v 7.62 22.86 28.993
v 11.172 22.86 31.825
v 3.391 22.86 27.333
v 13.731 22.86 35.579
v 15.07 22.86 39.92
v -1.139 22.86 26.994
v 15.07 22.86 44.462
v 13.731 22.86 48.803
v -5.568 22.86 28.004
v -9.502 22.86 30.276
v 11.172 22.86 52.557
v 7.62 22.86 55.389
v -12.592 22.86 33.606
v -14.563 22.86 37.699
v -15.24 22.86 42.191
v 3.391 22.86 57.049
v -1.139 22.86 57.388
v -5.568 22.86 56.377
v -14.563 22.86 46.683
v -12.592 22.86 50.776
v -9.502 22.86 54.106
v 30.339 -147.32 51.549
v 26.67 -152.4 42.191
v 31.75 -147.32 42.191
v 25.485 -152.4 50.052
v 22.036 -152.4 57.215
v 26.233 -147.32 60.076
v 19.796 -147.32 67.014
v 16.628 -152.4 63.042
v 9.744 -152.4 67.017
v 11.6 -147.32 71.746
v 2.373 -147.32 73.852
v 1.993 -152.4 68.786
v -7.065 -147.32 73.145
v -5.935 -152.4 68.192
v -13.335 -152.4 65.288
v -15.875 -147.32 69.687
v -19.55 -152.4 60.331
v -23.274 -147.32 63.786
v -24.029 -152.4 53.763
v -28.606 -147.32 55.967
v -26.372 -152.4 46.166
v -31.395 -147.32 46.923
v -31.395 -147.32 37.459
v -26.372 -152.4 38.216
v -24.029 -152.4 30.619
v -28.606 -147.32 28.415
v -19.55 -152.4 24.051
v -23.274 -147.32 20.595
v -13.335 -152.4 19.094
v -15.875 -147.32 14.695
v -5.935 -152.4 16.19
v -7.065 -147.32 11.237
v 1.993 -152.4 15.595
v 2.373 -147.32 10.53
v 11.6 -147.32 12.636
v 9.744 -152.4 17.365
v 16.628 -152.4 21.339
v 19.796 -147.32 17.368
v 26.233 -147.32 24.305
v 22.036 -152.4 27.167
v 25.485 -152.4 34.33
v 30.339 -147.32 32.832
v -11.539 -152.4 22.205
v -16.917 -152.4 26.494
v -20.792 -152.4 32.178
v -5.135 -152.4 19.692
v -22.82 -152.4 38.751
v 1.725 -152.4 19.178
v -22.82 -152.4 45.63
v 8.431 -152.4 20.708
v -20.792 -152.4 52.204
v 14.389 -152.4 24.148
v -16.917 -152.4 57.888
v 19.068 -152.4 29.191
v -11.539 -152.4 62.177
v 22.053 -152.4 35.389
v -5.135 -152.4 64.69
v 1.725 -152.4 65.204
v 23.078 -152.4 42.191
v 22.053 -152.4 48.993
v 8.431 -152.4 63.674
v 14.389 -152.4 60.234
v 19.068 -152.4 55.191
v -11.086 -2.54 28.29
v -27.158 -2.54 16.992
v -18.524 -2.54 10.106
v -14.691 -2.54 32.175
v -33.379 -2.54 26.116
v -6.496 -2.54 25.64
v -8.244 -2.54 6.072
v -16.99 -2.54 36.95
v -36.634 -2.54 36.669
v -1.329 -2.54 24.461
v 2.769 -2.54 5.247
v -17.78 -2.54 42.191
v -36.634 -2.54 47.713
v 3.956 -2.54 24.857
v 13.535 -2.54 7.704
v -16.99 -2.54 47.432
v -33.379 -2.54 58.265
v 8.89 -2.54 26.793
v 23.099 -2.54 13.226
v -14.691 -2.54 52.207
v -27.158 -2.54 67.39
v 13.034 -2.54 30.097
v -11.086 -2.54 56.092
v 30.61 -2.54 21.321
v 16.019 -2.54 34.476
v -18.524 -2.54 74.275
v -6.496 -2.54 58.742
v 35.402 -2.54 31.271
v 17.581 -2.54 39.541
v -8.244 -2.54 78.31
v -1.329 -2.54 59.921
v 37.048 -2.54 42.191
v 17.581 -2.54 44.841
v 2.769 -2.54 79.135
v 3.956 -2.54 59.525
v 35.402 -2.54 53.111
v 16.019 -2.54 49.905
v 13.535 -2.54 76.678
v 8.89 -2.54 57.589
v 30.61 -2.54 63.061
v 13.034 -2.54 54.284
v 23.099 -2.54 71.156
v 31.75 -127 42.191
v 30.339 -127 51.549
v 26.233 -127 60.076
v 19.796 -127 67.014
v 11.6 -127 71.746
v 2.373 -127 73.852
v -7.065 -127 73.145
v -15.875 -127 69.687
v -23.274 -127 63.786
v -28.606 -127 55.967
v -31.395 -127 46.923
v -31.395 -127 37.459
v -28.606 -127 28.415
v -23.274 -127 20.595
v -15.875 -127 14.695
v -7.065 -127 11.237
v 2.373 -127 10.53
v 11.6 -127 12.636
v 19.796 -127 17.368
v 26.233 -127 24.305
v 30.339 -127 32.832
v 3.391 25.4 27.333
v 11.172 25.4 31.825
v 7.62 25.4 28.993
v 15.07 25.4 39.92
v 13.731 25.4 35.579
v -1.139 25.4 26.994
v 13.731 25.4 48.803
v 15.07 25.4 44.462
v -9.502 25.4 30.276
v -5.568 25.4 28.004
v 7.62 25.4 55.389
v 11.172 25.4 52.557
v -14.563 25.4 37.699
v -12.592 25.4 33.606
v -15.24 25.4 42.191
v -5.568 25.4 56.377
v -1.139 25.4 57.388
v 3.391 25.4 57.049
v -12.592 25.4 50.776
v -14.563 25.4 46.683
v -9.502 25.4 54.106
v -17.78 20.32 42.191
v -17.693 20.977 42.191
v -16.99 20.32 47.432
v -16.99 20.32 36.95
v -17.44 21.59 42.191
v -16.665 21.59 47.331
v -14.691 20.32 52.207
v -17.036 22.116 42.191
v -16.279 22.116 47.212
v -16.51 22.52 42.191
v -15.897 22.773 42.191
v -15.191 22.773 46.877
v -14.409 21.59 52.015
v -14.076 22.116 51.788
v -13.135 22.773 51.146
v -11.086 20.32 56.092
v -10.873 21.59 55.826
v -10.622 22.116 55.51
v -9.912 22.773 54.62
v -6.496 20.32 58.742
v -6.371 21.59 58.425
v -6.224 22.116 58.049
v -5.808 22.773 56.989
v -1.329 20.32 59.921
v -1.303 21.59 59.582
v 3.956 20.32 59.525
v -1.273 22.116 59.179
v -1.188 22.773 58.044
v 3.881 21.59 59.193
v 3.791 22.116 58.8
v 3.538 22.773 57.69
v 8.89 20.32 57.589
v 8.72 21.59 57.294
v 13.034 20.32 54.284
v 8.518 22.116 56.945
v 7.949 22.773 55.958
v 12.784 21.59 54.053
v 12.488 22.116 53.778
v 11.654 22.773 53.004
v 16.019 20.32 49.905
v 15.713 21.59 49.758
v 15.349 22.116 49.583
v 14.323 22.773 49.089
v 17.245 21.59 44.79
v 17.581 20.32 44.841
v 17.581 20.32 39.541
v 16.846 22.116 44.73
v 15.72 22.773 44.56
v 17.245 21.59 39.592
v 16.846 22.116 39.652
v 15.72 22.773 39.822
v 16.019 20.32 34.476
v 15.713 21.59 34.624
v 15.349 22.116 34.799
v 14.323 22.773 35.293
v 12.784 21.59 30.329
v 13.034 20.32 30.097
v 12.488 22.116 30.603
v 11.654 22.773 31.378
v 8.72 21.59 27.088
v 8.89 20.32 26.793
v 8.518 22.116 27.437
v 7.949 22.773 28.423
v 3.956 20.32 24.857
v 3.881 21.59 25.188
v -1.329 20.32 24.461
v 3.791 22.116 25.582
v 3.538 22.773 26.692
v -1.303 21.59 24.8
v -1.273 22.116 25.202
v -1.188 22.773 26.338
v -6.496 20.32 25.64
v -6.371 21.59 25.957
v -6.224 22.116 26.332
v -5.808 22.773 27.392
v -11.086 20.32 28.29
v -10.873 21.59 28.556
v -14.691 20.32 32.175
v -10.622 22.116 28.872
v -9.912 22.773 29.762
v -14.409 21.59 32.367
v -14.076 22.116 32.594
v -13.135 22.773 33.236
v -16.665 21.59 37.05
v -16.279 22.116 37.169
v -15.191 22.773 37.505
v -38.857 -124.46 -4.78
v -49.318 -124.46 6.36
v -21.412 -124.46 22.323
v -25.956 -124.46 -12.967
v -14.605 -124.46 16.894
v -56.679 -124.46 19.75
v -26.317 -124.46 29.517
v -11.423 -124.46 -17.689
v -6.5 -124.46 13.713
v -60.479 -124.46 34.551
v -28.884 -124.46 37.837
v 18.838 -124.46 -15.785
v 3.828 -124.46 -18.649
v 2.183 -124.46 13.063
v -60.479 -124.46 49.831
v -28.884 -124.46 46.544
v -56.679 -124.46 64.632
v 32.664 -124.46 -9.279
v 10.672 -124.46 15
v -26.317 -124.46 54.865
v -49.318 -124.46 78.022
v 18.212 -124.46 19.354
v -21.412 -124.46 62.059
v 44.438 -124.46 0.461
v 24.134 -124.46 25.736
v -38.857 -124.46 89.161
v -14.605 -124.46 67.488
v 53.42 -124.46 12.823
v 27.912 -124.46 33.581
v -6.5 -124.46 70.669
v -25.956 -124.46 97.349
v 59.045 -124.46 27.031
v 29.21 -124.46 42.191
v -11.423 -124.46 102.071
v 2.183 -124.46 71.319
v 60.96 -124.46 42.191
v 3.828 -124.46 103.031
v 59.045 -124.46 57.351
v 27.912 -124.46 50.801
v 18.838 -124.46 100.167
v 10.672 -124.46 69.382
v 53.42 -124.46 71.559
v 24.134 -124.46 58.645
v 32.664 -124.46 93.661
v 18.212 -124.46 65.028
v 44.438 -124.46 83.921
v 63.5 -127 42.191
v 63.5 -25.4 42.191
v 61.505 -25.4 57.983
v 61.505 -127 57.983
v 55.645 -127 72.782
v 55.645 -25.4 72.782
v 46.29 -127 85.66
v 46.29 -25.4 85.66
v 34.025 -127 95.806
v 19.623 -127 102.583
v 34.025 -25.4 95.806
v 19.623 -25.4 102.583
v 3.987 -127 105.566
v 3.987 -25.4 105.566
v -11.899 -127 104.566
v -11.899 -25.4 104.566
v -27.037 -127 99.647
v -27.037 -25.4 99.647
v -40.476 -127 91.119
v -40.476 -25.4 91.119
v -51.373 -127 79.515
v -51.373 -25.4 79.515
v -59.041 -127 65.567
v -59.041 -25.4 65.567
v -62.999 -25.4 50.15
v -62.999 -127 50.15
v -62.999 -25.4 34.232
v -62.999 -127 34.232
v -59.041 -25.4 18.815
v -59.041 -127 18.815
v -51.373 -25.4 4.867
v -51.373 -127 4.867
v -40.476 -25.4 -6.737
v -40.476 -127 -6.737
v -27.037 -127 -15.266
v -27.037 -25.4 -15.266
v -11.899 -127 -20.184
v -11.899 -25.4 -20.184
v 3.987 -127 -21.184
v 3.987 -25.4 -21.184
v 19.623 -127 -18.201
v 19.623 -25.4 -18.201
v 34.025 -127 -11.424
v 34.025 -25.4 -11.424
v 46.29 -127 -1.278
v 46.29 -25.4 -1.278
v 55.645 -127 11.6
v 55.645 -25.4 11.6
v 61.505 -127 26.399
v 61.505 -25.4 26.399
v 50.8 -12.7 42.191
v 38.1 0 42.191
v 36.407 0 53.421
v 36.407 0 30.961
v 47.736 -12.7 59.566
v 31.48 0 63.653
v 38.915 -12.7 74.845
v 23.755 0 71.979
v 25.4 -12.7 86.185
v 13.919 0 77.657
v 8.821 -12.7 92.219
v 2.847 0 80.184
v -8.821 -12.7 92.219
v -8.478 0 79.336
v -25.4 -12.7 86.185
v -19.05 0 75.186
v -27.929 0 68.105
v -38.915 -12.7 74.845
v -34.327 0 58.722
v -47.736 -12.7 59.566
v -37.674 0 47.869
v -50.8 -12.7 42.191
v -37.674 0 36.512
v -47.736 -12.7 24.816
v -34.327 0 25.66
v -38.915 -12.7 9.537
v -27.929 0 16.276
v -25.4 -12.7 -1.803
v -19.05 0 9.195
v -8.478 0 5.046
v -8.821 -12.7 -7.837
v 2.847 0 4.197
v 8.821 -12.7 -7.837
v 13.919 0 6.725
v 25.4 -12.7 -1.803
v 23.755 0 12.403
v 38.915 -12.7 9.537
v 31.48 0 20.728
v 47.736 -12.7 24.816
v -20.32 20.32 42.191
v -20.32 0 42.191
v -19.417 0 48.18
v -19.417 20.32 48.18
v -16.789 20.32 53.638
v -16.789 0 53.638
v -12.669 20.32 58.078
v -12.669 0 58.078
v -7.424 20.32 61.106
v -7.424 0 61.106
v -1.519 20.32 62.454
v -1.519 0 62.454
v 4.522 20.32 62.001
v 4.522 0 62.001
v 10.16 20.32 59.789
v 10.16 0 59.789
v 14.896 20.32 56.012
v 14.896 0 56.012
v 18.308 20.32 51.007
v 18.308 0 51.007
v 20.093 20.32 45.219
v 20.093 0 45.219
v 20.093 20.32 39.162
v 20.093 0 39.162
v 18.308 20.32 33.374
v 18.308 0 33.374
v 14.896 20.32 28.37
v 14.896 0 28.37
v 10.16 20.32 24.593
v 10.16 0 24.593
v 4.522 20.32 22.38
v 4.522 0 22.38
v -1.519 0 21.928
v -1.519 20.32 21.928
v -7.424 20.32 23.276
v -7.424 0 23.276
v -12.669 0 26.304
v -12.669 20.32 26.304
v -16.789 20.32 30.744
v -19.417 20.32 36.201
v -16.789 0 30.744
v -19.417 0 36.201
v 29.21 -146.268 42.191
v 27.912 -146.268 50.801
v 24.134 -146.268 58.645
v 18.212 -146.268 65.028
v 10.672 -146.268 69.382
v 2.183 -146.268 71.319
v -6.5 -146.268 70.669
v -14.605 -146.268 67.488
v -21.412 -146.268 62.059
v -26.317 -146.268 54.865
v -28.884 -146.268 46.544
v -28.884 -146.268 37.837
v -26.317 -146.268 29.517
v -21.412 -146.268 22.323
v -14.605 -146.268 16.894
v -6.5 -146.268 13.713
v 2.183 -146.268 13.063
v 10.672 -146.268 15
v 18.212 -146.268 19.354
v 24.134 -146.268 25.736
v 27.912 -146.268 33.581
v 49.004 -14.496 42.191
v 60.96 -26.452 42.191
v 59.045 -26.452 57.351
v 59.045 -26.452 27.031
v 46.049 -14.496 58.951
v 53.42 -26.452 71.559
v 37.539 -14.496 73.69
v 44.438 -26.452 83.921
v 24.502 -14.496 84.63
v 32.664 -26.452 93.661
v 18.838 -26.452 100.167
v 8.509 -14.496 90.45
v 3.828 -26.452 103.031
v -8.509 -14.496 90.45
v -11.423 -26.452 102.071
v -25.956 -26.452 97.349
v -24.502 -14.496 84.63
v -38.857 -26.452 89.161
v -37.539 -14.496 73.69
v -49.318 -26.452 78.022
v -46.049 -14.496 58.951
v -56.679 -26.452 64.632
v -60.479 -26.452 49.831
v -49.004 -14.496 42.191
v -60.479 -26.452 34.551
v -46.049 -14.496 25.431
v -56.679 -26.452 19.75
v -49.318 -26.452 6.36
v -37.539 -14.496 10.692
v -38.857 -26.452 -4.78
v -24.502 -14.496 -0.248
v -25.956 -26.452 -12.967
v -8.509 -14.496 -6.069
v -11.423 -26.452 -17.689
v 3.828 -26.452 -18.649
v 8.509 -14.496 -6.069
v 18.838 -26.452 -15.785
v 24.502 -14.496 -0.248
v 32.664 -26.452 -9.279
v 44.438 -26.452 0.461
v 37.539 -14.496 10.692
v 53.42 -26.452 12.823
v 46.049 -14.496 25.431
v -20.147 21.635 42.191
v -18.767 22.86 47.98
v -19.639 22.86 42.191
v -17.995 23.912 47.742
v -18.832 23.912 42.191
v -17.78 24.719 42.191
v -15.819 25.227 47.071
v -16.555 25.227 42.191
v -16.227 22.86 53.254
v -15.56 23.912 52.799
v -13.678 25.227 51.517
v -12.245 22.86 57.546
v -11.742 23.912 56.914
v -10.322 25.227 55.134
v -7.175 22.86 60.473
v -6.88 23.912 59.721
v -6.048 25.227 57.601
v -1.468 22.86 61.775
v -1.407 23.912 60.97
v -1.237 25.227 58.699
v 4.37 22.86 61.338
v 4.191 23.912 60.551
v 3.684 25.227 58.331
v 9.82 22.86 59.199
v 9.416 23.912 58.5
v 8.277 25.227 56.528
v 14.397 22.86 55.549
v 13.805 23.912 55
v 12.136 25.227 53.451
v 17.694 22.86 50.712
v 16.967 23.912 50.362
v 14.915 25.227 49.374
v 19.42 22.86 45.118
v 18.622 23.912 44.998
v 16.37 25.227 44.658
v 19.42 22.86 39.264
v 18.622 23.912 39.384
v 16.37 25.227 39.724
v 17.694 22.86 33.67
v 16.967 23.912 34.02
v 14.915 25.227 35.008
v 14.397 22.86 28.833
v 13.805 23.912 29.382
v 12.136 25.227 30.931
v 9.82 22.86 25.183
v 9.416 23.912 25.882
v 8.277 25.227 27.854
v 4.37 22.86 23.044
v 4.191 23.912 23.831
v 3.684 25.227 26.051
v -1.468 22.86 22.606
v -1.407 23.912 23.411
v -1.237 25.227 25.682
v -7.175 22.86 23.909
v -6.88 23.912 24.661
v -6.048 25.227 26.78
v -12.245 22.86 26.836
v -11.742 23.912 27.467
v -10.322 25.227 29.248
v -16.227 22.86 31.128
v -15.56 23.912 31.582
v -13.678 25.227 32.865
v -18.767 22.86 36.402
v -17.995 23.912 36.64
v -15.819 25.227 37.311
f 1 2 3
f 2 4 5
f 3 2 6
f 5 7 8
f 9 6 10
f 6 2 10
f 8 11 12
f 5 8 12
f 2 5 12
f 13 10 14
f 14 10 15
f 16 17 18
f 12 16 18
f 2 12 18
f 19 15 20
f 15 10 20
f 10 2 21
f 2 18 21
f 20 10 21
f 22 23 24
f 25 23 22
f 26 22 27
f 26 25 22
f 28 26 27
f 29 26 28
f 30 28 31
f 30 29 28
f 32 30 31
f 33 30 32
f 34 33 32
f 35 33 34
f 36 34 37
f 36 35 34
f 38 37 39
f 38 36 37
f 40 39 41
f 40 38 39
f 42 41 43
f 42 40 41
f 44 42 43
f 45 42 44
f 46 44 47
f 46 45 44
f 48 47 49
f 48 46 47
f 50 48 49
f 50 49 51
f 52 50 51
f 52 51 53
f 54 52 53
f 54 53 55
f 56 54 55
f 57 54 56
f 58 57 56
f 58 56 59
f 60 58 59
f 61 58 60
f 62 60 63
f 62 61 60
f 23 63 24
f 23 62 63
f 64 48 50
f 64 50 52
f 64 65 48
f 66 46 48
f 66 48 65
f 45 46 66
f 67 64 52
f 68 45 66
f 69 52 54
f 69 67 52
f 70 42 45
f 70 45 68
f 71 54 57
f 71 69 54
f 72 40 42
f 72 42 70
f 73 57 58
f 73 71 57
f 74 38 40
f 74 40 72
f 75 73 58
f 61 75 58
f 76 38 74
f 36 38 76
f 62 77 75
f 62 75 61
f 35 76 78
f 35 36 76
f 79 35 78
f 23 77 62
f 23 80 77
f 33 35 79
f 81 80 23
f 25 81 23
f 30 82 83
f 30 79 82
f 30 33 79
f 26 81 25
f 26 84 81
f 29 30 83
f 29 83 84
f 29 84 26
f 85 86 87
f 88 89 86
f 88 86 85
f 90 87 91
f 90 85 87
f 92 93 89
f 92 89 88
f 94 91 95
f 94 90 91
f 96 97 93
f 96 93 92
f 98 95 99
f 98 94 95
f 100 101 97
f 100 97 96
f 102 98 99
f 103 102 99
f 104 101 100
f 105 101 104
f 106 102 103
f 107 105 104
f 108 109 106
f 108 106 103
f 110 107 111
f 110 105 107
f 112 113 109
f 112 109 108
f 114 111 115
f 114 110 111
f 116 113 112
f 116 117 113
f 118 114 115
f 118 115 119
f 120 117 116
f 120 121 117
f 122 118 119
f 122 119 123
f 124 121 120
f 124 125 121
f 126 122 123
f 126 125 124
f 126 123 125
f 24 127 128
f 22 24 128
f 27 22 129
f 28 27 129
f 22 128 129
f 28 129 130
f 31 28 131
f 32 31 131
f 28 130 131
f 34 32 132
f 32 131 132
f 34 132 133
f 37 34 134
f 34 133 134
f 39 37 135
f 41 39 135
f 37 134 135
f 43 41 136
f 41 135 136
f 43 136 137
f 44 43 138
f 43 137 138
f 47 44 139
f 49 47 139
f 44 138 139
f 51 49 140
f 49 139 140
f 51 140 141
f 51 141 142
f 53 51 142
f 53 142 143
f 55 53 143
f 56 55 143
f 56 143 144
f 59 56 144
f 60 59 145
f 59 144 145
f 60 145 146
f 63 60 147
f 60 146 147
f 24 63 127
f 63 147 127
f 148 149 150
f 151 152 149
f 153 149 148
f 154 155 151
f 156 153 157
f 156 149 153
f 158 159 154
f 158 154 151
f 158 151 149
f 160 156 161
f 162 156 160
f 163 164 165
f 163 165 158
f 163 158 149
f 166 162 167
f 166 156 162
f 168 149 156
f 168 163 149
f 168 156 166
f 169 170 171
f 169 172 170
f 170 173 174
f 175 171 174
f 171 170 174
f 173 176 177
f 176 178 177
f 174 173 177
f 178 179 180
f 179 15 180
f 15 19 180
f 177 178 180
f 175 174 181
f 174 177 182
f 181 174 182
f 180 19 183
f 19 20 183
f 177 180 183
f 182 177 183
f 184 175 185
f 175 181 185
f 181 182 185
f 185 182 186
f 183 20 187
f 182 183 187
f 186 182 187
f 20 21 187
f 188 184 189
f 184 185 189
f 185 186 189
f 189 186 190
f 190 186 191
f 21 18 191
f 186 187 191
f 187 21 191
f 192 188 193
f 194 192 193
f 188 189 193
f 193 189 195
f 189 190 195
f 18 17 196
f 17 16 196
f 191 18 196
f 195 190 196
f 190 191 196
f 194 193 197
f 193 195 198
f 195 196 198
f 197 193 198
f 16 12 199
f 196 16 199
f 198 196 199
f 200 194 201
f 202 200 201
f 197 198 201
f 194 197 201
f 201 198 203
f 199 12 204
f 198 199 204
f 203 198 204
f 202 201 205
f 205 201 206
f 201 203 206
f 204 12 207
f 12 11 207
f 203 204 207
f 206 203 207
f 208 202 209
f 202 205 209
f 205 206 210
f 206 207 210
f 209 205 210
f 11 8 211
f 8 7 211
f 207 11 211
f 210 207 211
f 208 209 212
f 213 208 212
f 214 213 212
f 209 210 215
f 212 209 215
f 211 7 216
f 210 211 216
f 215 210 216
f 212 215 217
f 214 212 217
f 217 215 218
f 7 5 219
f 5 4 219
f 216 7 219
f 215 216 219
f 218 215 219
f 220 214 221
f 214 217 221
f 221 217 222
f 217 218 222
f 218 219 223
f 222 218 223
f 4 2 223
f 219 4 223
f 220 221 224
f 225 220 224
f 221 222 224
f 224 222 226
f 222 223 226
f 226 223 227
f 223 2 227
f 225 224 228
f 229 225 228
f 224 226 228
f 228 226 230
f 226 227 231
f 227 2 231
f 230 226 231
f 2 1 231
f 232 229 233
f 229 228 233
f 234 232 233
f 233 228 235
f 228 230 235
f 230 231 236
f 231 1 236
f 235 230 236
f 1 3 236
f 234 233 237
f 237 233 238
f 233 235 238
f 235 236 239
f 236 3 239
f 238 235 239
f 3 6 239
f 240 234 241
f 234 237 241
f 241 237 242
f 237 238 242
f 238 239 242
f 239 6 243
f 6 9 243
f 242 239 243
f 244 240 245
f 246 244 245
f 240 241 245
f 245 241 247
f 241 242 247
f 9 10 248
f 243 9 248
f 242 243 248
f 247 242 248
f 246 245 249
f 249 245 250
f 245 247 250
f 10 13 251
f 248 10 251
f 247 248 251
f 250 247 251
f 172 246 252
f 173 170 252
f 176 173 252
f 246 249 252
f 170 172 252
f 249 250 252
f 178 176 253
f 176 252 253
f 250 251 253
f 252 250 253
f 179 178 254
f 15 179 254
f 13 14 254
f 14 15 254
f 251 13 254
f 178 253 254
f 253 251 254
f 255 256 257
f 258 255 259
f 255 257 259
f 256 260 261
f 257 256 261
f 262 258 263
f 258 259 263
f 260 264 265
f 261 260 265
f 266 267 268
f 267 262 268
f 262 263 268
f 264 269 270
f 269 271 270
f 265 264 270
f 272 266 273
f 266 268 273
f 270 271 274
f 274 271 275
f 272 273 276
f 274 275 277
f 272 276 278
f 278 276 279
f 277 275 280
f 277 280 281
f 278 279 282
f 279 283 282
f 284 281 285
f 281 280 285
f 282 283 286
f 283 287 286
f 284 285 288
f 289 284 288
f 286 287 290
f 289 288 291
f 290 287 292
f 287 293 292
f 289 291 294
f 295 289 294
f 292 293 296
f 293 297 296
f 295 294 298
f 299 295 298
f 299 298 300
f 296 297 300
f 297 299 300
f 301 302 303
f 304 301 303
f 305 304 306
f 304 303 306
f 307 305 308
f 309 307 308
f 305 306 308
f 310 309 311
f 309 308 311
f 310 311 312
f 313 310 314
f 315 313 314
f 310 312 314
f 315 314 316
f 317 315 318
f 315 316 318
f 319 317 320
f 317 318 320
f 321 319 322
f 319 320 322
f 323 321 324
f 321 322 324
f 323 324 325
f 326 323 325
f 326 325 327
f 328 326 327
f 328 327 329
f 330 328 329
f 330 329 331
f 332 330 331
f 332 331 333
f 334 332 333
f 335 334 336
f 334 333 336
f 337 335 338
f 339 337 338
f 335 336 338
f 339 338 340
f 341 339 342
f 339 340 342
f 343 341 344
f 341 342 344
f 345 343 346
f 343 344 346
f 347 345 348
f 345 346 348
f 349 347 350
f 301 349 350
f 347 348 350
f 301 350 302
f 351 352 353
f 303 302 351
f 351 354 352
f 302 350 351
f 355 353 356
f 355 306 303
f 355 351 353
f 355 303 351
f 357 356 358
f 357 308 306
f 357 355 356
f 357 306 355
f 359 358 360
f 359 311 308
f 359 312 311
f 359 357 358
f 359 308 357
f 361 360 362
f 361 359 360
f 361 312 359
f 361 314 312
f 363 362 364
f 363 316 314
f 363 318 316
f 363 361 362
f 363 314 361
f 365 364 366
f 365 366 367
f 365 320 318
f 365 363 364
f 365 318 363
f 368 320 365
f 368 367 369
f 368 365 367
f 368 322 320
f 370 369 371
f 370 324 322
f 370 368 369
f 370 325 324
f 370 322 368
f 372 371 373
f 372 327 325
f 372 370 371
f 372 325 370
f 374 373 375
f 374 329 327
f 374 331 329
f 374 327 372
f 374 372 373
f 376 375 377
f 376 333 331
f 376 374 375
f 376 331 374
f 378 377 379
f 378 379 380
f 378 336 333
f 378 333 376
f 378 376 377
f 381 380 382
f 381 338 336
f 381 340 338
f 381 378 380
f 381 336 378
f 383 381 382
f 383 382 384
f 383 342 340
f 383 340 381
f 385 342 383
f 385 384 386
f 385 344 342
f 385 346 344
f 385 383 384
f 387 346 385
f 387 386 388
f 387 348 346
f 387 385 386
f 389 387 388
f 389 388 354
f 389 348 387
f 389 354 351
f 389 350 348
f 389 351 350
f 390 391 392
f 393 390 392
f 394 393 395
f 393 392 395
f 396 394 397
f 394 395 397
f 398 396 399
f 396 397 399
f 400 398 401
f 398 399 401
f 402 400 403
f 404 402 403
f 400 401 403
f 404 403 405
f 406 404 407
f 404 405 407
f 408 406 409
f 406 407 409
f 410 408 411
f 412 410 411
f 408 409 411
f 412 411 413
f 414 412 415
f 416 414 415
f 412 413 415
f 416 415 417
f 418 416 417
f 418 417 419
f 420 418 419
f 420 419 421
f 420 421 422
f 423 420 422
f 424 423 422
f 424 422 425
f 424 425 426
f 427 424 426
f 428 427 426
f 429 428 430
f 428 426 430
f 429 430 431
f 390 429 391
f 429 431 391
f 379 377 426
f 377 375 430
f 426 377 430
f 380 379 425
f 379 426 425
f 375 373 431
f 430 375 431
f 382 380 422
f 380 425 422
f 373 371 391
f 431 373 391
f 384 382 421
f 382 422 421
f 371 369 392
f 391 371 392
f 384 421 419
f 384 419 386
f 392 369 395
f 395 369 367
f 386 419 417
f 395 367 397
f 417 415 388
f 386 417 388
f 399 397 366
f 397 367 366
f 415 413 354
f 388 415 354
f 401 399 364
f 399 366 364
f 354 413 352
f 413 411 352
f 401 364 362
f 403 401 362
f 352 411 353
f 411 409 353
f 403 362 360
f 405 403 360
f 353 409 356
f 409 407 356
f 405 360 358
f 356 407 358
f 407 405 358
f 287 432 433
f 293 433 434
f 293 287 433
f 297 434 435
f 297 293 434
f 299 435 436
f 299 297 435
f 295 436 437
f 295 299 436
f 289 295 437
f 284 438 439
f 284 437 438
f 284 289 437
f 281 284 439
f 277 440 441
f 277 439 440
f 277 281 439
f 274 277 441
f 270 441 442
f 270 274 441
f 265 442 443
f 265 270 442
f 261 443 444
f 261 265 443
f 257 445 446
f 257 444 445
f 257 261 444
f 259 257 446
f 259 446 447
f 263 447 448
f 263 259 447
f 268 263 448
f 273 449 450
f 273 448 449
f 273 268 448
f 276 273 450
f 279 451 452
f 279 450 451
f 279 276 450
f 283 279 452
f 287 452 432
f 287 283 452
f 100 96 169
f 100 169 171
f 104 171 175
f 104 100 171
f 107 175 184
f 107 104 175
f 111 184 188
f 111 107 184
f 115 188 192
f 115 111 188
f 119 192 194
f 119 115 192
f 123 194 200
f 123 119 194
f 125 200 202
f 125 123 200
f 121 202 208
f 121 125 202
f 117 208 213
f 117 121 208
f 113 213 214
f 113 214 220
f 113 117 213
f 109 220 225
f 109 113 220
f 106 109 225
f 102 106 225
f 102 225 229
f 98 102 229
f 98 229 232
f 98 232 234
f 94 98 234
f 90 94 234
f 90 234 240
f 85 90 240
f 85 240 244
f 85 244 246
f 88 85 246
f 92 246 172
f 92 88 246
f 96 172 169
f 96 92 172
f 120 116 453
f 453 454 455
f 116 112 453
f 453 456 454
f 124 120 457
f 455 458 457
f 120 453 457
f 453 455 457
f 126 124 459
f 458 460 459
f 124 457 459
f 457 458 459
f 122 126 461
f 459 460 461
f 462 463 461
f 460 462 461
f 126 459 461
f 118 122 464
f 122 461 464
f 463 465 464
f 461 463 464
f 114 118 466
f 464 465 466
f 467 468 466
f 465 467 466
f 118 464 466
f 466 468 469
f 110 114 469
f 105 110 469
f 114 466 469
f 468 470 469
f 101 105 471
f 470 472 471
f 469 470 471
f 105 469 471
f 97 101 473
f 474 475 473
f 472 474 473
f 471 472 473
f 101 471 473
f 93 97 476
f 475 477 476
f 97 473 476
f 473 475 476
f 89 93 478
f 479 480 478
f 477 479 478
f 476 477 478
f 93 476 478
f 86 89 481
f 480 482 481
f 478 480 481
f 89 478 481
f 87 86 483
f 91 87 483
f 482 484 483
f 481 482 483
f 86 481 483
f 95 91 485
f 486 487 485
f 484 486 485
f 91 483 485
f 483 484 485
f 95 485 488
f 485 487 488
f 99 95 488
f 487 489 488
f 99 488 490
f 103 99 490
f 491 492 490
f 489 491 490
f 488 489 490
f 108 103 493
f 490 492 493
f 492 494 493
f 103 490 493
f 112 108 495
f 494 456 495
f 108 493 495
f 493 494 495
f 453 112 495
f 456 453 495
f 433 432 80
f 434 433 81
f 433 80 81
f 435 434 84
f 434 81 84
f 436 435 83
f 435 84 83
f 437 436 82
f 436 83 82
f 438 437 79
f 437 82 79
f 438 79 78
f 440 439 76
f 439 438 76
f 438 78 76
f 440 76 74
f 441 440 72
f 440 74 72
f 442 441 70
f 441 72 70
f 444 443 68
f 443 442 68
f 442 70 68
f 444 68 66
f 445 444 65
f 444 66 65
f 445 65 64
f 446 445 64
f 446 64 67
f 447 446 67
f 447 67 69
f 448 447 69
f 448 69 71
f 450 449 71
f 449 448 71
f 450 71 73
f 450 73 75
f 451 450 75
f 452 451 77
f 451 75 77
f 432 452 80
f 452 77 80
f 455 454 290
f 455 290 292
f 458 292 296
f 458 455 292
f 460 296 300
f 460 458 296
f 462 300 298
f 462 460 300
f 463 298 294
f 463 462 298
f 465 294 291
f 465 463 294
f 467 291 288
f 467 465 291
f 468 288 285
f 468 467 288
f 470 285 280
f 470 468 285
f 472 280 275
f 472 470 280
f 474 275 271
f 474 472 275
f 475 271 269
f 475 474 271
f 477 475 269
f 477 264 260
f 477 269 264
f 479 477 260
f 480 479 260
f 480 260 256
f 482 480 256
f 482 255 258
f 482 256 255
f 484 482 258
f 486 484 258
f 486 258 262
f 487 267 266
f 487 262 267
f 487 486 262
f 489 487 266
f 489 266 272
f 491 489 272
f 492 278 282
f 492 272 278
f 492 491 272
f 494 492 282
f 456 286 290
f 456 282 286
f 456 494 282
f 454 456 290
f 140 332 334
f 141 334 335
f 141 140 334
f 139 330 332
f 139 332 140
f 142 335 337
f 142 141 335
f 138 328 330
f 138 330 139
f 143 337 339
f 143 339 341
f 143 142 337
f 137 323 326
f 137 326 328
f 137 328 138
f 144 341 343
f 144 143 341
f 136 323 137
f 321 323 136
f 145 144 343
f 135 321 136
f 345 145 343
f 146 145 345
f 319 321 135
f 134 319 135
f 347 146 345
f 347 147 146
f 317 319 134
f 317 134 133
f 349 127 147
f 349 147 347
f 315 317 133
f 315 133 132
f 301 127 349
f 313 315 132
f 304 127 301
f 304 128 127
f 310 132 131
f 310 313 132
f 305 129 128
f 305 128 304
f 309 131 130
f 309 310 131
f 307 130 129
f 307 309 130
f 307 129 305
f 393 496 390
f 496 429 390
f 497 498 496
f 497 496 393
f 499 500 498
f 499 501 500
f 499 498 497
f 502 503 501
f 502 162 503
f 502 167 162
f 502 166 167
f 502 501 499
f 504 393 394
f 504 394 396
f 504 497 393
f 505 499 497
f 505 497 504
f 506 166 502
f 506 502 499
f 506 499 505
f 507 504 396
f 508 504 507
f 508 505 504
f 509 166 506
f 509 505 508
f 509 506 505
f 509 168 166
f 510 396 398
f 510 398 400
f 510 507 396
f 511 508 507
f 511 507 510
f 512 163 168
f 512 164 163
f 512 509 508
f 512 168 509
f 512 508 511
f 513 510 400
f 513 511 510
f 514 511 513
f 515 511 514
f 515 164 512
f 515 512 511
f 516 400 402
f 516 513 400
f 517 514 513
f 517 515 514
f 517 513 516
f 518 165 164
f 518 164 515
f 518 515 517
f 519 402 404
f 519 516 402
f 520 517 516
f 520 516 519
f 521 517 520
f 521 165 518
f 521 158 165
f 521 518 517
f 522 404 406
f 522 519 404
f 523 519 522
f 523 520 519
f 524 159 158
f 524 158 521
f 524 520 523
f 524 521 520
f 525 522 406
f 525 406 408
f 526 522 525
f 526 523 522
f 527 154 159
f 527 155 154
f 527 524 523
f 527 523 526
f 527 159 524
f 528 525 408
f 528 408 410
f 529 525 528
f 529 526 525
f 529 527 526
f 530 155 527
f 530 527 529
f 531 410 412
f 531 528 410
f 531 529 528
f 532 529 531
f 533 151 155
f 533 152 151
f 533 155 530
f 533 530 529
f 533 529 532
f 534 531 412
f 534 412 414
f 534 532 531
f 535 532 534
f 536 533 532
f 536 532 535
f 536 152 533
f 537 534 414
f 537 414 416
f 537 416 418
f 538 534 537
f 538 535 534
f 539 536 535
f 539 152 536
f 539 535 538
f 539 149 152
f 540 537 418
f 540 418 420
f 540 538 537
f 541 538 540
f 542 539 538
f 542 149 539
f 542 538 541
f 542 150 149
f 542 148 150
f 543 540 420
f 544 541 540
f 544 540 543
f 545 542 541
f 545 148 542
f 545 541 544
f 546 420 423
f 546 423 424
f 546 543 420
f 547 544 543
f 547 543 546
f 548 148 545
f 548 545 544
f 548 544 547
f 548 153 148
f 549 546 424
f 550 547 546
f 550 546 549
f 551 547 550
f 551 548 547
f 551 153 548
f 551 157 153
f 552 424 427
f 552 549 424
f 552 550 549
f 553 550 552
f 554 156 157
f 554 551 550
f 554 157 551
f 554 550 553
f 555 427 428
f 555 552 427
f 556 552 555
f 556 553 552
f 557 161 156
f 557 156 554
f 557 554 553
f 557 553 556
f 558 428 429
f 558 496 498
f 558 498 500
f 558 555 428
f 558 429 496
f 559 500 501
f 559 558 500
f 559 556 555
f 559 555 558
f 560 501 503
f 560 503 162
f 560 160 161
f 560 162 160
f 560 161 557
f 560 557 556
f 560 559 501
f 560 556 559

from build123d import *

# Parameters (mm, degrees)
F0_R     = 63.5
F1_DEPTH = 127
F2_R     = 31.75
F3_DEPTH = 25.4
F4_R     = 20.32
F5_DEPTH = 25.4
F6_R     = 5.08
F7_SIZE  = 25.4
F8_SIZE  = 5.08
F9_T     = -2.54


with BuildPart() as f1:
    # F0 (on Front) → F1 (new body)
    with BuildSketch(Plane.XZ):
        with Locations((0, 42.1909095929)):
            Circle(F0_R)
    extrude(amount=F1_DEPTH)

    # F2 (on face) → F3 (join)
    with BuildSketch(Plane.XZ.offset(127)):
        with Locations((0, 42.1909095929)):
            Circle(F2_R)
    extrude(amount=F3_DEPTH)

    # F4 (on face) → F5 (join)
    with BuildSketch(Plane(origin=(0, 0, 0), x_dir=(-1, 0, 0), z_dir=(0, 1, 0))):
        with Locations((0, 42.1909095929)):
            Circle(F4_R)
    extrude(amount=F5_DEPTH)

    # F6
    f6_edges = [f1.edges().sort_by_distance(p)[0] for p in [
        (20.32, 25.4, 42.19091),
    ]]
    fillet(f6_edges, radius=F6_R)

    # F7
    f7_edges = [f1.edges().sort_by_distance(p)[0] for p in [
        (-63.5, 0, 42.19091),
    ]]
    chamfer(f7_edges, length=F7_SIZE)

    # F8
    f8_edges = [f1.edges().sort_by_distance(p)[0] for p in [
        (-31.75, -152.4, 42.19091),
    ]]
    chamfer(f8_edges, length=F8_SIZE)

    # F9
    f9_openings = [f1.faces().sort_by_distance(p)[0] for p in [
        (0, -152.4, 42.19091),
    ]]
    offset(amount=F9_T, openings=f9_openings, kind=Kind.INTERSECTION)


solid = f1.part
